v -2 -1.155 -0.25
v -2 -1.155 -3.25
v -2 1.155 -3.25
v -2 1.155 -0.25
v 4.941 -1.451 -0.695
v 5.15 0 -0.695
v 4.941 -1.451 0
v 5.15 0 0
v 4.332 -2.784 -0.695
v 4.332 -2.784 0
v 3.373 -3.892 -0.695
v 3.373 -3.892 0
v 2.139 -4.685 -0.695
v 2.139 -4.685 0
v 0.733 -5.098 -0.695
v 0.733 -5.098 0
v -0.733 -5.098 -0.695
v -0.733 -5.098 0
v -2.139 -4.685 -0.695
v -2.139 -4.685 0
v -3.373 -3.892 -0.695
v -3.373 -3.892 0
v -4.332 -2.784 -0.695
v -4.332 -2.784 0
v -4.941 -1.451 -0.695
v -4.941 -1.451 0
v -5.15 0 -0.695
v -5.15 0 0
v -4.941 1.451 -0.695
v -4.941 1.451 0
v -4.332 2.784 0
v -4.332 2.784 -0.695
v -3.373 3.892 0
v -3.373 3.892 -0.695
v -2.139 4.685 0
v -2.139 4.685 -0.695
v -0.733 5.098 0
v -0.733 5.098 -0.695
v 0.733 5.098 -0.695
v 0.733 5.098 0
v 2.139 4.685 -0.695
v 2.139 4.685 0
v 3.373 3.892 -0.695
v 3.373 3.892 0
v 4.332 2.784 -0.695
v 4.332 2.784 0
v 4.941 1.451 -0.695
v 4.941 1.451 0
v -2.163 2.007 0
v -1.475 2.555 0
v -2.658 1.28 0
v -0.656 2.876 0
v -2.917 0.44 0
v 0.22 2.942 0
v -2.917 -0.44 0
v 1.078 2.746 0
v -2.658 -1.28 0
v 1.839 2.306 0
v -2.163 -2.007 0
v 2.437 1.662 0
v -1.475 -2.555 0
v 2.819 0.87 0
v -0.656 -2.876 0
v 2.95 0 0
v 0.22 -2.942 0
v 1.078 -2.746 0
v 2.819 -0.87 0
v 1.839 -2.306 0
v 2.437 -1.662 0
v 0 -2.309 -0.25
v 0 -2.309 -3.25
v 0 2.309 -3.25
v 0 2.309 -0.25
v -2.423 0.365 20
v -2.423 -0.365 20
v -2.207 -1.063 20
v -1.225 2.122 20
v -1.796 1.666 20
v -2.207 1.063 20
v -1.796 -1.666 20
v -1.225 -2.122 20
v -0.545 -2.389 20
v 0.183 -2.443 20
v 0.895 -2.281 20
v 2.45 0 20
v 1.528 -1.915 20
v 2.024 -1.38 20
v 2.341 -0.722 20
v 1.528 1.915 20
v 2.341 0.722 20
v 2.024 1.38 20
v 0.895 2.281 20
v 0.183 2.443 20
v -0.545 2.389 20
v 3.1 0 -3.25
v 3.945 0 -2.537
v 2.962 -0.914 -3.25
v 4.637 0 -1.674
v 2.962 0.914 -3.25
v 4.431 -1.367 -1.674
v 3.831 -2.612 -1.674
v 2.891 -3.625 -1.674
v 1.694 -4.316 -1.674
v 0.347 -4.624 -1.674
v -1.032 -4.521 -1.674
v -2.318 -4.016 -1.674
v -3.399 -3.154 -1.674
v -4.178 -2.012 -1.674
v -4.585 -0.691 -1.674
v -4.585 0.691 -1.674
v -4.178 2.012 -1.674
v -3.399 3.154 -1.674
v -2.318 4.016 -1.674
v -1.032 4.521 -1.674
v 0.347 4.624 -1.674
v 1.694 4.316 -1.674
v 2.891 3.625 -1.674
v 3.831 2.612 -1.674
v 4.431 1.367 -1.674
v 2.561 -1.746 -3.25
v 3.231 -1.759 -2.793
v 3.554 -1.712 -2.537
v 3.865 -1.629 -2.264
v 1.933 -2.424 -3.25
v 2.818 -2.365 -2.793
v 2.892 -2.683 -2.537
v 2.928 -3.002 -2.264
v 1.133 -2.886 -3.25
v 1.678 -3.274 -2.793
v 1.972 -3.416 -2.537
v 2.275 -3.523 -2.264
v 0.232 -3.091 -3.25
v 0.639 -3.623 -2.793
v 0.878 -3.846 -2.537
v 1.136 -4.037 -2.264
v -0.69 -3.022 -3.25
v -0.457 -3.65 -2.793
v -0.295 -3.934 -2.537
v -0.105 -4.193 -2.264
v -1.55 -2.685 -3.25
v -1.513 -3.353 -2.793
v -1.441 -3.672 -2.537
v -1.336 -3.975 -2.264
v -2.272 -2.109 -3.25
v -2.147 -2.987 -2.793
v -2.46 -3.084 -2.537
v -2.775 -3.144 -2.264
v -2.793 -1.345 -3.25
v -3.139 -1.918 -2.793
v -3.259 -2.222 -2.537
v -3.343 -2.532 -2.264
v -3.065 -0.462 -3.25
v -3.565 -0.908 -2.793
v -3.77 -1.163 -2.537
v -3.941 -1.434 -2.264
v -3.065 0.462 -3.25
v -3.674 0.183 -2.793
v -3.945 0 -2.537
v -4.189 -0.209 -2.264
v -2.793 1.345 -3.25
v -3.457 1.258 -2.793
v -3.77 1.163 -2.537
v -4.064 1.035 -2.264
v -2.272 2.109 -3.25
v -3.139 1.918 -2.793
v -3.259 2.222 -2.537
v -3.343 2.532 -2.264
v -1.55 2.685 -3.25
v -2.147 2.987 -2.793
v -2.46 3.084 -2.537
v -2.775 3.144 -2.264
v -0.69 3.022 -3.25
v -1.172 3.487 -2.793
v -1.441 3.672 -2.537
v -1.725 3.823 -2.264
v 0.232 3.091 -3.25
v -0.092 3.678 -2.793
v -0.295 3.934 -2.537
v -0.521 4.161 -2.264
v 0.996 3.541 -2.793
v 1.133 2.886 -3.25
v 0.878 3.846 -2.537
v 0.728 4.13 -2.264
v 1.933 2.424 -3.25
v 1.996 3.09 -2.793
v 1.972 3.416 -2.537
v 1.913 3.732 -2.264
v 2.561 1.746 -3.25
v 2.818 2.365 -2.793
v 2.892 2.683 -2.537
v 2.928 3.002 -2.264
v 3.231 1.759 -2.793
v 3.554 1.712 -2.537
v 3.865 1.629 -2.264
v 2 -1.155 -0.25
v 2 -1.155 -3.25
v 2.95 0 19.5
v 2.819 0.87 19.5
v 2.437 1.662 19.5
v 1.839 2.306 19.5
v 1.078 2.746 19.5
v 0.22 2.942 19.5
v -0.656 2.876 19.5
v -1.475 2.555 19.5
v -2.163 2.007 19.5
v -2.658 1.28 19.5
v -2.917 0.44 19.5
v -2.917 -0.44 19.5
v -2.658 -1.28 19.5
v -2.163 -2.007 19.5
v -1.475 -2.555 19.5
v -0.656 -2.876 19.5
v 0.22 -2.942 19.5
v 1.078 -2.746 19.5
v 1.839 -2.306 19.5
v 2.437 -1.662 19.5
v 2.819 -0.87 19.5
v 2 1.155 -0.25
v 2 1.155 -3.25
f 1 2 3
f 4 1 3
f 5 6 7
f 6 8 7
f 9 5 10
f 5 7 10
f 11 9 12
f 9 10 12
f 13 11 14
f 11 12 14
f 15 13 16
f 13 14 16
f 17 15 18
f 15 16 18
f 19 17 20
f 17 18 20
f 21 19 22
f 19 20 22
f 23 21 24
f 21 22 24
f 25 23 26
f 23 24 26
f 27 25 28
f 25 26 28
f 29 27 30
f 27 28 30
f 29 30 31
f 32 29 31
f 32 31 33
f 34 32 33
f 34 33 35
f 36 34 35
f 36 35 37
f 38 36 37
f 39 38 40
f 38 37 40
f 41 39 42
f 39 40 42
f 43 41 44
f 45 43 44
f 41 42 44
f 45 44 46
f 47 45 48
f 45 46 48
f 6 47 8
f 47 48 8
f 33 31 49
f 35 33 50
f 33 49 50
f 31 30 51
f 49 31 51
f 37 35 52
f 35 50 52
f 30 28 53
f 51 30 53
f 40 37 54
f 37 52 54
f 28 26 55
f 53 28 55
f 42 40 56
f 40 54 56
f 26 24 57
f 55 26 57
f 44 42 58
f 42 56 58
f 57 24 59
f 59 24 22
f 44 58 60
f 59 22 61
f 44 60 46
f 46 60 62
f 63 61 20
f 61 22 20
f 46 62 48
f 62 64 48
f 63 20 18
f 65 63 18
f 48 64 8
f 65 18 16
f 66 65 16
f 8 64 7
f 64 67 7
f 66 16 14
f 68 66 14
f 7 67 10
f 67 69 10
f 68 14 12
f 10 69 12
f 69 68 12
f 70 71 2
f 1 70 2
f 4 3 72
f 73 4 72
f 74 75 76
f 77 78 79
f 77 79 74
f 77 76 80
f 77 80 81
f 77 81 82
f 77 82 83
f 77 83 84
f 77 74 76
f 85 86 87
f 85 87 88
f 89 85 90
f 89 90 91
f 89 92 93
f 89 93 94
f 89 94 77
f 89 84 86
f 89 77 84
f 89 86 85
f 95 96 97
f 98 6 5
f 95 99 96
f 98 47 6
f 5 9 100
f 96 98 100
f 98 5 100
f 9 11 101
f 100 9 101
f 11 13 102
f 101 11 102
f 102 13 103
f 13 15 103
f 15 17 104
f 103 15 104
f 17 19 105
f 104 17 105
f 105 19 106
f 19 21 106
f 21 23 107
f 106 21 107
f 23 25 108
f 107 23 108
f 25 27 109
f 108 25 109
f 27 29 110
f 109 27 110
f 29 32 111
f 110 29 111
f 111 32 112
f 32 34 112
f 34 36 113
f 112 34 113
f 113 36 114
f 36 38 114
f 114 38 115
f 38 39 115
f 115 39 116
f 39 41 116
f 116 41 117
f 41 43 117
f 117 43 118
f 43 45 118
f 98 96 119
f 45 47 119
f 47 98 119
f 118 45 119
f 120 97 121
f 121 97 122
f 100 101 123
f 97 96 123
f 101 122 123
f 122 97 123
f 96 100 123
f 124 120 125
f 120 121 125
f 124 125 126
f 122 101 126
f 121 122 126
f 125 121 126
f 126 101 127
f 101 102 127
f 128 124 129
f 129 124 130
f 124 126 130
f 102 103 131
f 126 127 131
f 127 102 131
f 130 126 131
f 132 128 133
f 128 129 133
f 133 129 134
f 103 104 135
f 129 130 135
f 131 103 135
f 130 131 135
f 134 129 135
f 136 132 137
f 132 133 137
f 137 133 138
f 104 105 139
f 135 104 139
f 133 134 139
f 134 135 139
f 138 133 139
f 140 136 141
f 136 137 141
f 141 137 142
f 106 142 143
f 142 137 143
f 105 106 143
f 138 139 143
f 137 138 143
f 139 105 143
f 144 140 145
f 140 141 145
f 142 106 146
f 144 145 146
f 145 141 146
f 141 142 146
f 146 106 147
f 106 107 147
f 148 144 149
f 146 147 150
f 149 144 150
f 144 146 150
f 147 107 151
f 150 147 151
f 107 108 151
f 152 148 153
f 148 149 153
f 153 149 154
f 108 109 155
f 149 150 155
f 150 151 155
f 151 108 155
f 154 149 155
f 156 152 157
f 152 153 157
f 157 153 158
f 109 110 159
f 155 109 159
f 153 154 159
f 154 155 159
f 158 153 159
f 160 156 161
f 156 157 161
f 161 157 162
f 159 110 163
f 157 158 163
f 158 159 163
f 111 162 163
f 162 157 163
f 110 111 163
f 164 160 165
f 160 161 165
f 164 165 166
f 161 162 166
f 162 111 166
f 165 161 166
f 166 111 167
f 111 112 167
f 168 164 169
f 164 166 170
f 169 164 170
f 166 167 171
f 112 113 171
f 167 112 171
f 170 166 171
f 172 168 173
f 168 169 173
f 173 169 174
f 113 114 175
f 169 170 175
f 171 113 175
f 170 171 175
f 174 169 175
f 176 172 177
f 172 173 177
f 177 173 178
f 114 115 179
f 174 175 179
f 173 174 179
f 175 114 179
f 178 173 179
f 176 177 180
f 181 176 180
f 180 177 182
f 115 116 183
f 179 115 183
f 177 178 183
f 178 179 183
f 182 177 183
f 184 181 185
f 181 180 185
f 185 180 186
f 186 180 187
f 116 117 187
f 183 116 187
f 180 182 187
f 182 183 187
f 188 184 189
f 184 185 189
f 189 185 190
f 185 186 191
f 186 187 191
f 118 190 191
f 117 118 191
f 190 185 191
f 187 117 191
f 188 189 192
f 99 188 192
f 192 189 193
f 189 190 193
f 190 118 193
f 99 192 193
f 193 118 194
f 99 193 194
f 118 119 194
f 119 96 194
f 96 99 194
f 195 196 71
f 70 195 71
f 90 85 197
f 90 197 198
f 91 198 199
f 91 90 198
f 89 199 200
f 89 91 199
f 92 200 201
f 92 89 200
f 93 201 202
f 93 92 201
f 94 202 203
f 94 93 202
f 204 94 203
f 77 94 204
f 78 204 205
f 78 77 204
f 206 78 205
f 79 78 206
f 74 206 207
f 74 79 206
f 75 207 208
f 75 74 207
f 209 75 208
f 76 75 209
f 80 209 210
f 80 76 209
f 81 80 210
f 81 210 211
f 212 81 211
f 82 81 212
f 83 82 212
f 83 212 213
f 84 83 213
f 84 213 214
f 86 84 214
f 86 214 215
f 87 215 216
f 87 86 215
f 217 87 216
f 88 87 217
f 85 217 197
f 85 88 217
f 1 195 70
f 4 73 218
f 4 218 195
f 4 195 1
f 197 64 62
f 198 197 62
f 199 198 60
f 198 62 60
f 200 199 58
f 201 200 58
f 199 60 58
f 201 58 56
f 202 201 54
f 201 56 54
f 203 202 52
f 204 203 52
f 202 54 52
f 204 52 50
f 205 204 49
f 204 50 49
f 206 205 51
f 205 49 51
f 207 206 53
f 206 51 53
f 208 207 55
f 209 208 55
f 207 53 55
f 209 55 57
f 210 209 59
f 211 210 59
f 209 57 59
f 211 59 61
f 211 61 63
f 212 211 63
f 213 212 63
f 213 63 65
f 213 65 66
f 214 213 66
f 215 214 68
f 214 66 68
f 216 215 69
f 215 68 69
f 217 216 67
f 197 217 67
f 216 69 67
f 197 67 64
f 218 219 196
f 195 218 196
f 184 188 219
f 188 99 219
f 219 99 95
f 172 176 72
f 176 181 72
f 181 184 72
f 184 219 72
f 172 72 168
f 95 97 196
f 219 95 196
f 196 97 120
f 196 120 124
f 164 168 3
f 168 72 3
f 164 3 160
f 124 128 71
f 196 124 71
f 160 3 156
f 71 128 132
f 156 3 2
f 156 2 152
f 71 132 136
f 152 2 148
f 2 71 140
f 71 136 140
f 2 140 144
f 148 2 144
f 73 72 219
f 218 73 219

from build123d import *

# Parameters (mm, degrees)
SKIZZE1_R                       = 2.95
AUFSATZ_LINEAR_AUSTRAGEN1_DEPTH = 20
FASE1_SIZE                      = 0.5
SCHNITT_LINEAR_AUSTRAGEN1_DEPTH = 3


with BuildPart() as part:
    # Skizze1 → Aufsatz-Linear austragen1 (new body)
    with BuildSketch(Plane.XY):
        Circle(SKIZZE1_R)
    extrude(amount=AUFSATZ_LINEAR_AUSTRAGEN1_DEPTH)

    # Skizze2 → Rotation1 (revolve)
    with BuildSketch(Plane(origin=(0, 0, 0), x_dir=(0, 0, -1), z_dir=(1, 0, 0)), mode=Mode.PRIVATE) as rotation1_sk:
        with BuildLine():
            Line((3.25, 0), (3.25, 3.1))
            ThreePointArc((3.25, 3.1), (2.122398964, 4.311690857), (0.695193089, 5.15))
            Line((0.695193089, 5.15), (0, 5.15))
            Line((0, 5.15), (0, 0))
            Line((0, 0), (3.25, 0))
        make_face()
    revolve(rotation1_sk.sketch.rotate(Axis((0, 0, 0), (0, 0, -1)), 90), axis=Axis((0, 0, 0), (0, 0, -1)))

    # Fase1
    fase1_edges = [part.edges().sort_by_distance(p)[0] for p in [
        (-2.95, 0, 20),
    ]]
    chamfer(fase1_edges, length=FASE1_SIZE)

    # Skizze3 → Schnitt-Linear austragen1 (cut)
    with BuildSketch(Plane(origin=(0, 0, -3.25), x_dir=(-1, 0, 0), z_dir=(0, 0, -1))):
        Polygon((2, 1.154700538), (0, 2.309401077), (-2, 1.154700538), (-2, -1.154700538), (0, -2.309401077), (2, -1.154700538), align=None)
    extrude(amount=-SCHNITT_LINEAR_AUSTRAGEN1_DEPTH, mode=Mode.SUBTRACT)


solid = part.part
